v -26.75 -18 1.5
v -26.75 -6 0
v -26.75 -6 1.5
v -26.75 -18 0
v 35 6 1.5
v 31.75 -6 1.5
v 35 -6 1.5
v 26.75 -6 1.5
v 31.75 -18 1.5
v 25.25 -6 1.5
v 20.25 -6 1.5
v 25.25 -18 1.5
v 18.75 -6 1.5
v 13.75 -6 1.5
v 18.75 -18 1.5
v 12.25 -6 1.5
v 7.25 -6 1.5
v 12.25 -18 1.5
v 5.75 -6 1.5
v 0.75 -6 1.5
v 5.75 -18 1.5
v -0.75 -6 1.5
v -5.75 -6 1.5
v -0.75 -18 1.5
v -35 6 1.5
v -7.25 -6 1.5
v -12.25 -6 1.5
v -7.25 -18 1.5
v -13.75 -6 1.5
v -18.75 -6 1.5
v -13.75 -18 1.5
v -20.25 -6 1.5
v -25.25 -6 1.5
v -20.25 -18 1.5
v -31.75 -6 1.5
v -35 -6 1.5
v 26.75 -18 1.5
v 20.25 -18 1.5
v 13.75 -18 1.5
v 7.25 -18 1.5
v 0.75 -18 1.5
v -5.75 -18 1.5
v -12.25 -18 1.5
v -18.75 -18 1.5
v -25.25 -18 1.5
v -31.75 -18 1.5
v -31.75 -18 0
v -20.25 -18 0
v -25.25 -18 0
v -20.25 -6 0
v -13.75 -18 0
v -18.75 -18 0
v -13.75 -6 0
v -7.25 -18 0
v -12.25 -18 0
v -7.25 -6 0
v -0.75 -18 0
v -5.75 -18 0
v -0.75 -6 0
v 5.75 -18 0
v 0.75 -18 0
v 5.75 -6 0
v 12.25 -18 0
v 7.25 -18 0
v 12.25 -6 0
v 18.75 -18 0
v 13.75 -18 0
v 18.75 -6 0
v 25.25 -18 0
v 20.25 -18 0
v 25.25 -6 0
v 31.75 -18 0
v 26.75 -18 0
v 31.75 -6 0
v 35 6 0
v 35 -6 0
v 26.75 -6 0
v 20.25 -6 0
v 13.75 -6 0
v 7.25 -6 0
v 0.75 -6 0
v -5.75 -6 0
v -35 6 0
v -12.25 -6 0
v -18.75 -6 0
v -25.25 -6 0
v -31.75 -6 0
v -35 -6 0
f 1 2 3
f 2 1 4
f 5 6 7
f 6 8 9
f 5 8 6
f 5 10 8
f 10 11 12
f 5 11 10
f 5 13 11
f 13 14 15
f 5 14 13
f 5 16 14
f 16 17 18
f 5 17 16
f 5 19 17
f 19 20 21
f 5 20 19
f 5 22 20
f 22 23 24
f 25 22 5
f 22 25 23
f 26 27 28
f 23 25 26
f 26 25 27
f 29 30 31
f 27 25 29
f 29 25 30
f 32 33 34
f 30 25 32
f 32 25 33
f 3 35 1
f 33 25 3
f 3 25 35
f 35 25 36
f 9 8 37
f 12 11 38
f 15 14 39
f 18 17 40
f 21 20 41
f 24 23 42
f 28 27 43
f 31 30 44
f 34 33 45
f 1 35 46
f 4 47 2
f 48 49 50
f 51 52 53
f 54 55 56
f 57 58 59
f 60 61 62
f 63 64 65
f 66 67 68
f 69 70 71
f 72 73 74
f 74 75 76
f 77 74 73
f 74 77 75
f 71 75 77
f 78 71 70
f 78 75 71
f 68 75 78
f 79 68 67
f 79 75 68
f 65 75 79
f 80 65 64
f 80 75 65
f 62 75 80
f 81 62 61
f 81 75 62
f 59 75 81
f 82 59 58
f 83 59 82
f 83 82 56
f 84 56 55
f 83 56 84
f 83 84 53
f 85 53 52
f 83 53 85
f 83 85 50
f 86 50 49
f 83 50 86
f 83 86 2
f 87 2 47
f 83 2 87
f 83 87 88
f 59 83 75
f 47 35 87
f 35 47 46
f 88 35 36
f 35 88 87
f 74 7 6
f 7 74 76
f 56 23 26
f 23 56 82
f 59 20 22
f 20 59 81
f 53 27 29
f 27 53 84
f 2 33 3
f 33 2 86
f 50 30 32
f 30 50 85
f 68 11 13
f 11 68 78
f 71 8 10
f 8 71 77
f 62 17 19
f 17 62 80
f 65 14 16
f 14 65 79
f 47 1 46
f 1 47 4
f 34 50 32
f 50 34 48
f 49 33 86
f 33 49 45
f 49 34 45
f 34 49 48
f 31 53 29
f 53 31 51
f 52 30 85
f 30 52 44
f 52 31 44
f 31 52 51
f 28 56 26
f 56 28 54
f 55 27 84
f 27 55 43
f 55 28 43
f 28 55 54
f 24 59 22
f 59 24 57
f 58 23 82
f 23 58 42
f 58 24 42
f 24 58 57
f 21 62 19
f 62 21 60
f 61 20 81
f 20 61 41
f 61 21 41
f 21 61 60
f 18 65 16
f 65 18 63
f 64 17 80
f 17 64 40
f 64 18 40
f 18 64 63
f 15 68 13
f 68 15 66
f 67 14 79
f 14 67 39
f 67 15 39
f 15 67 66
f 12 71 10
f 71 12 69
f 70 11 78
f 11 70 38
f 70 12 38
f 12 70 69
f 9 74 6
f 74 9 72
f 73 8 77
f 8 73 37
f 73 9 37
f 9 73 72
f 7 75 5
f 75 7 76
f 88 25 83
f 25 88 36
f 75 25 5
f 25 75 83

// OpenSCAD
// 10-well comb for agarose gel casting, printed lying flat
// Units: mm

$fn = 64;

// --- Plate ---
plate_len   = 70;   // spine length (X)
plate_wid   = 12;   // spine width (Y)
plate_thk   = 1.5;  // plate thickness (Z)

// --- Teeth ---
teeth_n     = 10;   // number of teeth
teeth_w     = 5.0;  // tooth width (X)
teeth_l     = 12;   // tooth length (Y)
teeth_gap   = 1.5;  // gap between teeth (X)

// Derived
teeth_total_w = (teeth_n - 1) * teeth_gap + teeth_n * teeth_w;  // row width in X
overhang      = (plate_len - teeth_total_w) / 2;                // centre offset

union() {
    // Plate with spine
    translate([-plate_len / 2, -plate_wid / 2, 0])
        cube([plate_len, plate_wid, plate_thk]);

    // Teeth hanging in -Y from one long edge
    for (i = [0 : teeth_n - 1]) {
        translate([-plate_len / 2 + overhang + i * (teeth_w + teeth_gap),
                   -plate_wid / 2 - teeth_l,
                   0])
            cube([teeth_w, teeth_l, plate_thk]);
    }
}
